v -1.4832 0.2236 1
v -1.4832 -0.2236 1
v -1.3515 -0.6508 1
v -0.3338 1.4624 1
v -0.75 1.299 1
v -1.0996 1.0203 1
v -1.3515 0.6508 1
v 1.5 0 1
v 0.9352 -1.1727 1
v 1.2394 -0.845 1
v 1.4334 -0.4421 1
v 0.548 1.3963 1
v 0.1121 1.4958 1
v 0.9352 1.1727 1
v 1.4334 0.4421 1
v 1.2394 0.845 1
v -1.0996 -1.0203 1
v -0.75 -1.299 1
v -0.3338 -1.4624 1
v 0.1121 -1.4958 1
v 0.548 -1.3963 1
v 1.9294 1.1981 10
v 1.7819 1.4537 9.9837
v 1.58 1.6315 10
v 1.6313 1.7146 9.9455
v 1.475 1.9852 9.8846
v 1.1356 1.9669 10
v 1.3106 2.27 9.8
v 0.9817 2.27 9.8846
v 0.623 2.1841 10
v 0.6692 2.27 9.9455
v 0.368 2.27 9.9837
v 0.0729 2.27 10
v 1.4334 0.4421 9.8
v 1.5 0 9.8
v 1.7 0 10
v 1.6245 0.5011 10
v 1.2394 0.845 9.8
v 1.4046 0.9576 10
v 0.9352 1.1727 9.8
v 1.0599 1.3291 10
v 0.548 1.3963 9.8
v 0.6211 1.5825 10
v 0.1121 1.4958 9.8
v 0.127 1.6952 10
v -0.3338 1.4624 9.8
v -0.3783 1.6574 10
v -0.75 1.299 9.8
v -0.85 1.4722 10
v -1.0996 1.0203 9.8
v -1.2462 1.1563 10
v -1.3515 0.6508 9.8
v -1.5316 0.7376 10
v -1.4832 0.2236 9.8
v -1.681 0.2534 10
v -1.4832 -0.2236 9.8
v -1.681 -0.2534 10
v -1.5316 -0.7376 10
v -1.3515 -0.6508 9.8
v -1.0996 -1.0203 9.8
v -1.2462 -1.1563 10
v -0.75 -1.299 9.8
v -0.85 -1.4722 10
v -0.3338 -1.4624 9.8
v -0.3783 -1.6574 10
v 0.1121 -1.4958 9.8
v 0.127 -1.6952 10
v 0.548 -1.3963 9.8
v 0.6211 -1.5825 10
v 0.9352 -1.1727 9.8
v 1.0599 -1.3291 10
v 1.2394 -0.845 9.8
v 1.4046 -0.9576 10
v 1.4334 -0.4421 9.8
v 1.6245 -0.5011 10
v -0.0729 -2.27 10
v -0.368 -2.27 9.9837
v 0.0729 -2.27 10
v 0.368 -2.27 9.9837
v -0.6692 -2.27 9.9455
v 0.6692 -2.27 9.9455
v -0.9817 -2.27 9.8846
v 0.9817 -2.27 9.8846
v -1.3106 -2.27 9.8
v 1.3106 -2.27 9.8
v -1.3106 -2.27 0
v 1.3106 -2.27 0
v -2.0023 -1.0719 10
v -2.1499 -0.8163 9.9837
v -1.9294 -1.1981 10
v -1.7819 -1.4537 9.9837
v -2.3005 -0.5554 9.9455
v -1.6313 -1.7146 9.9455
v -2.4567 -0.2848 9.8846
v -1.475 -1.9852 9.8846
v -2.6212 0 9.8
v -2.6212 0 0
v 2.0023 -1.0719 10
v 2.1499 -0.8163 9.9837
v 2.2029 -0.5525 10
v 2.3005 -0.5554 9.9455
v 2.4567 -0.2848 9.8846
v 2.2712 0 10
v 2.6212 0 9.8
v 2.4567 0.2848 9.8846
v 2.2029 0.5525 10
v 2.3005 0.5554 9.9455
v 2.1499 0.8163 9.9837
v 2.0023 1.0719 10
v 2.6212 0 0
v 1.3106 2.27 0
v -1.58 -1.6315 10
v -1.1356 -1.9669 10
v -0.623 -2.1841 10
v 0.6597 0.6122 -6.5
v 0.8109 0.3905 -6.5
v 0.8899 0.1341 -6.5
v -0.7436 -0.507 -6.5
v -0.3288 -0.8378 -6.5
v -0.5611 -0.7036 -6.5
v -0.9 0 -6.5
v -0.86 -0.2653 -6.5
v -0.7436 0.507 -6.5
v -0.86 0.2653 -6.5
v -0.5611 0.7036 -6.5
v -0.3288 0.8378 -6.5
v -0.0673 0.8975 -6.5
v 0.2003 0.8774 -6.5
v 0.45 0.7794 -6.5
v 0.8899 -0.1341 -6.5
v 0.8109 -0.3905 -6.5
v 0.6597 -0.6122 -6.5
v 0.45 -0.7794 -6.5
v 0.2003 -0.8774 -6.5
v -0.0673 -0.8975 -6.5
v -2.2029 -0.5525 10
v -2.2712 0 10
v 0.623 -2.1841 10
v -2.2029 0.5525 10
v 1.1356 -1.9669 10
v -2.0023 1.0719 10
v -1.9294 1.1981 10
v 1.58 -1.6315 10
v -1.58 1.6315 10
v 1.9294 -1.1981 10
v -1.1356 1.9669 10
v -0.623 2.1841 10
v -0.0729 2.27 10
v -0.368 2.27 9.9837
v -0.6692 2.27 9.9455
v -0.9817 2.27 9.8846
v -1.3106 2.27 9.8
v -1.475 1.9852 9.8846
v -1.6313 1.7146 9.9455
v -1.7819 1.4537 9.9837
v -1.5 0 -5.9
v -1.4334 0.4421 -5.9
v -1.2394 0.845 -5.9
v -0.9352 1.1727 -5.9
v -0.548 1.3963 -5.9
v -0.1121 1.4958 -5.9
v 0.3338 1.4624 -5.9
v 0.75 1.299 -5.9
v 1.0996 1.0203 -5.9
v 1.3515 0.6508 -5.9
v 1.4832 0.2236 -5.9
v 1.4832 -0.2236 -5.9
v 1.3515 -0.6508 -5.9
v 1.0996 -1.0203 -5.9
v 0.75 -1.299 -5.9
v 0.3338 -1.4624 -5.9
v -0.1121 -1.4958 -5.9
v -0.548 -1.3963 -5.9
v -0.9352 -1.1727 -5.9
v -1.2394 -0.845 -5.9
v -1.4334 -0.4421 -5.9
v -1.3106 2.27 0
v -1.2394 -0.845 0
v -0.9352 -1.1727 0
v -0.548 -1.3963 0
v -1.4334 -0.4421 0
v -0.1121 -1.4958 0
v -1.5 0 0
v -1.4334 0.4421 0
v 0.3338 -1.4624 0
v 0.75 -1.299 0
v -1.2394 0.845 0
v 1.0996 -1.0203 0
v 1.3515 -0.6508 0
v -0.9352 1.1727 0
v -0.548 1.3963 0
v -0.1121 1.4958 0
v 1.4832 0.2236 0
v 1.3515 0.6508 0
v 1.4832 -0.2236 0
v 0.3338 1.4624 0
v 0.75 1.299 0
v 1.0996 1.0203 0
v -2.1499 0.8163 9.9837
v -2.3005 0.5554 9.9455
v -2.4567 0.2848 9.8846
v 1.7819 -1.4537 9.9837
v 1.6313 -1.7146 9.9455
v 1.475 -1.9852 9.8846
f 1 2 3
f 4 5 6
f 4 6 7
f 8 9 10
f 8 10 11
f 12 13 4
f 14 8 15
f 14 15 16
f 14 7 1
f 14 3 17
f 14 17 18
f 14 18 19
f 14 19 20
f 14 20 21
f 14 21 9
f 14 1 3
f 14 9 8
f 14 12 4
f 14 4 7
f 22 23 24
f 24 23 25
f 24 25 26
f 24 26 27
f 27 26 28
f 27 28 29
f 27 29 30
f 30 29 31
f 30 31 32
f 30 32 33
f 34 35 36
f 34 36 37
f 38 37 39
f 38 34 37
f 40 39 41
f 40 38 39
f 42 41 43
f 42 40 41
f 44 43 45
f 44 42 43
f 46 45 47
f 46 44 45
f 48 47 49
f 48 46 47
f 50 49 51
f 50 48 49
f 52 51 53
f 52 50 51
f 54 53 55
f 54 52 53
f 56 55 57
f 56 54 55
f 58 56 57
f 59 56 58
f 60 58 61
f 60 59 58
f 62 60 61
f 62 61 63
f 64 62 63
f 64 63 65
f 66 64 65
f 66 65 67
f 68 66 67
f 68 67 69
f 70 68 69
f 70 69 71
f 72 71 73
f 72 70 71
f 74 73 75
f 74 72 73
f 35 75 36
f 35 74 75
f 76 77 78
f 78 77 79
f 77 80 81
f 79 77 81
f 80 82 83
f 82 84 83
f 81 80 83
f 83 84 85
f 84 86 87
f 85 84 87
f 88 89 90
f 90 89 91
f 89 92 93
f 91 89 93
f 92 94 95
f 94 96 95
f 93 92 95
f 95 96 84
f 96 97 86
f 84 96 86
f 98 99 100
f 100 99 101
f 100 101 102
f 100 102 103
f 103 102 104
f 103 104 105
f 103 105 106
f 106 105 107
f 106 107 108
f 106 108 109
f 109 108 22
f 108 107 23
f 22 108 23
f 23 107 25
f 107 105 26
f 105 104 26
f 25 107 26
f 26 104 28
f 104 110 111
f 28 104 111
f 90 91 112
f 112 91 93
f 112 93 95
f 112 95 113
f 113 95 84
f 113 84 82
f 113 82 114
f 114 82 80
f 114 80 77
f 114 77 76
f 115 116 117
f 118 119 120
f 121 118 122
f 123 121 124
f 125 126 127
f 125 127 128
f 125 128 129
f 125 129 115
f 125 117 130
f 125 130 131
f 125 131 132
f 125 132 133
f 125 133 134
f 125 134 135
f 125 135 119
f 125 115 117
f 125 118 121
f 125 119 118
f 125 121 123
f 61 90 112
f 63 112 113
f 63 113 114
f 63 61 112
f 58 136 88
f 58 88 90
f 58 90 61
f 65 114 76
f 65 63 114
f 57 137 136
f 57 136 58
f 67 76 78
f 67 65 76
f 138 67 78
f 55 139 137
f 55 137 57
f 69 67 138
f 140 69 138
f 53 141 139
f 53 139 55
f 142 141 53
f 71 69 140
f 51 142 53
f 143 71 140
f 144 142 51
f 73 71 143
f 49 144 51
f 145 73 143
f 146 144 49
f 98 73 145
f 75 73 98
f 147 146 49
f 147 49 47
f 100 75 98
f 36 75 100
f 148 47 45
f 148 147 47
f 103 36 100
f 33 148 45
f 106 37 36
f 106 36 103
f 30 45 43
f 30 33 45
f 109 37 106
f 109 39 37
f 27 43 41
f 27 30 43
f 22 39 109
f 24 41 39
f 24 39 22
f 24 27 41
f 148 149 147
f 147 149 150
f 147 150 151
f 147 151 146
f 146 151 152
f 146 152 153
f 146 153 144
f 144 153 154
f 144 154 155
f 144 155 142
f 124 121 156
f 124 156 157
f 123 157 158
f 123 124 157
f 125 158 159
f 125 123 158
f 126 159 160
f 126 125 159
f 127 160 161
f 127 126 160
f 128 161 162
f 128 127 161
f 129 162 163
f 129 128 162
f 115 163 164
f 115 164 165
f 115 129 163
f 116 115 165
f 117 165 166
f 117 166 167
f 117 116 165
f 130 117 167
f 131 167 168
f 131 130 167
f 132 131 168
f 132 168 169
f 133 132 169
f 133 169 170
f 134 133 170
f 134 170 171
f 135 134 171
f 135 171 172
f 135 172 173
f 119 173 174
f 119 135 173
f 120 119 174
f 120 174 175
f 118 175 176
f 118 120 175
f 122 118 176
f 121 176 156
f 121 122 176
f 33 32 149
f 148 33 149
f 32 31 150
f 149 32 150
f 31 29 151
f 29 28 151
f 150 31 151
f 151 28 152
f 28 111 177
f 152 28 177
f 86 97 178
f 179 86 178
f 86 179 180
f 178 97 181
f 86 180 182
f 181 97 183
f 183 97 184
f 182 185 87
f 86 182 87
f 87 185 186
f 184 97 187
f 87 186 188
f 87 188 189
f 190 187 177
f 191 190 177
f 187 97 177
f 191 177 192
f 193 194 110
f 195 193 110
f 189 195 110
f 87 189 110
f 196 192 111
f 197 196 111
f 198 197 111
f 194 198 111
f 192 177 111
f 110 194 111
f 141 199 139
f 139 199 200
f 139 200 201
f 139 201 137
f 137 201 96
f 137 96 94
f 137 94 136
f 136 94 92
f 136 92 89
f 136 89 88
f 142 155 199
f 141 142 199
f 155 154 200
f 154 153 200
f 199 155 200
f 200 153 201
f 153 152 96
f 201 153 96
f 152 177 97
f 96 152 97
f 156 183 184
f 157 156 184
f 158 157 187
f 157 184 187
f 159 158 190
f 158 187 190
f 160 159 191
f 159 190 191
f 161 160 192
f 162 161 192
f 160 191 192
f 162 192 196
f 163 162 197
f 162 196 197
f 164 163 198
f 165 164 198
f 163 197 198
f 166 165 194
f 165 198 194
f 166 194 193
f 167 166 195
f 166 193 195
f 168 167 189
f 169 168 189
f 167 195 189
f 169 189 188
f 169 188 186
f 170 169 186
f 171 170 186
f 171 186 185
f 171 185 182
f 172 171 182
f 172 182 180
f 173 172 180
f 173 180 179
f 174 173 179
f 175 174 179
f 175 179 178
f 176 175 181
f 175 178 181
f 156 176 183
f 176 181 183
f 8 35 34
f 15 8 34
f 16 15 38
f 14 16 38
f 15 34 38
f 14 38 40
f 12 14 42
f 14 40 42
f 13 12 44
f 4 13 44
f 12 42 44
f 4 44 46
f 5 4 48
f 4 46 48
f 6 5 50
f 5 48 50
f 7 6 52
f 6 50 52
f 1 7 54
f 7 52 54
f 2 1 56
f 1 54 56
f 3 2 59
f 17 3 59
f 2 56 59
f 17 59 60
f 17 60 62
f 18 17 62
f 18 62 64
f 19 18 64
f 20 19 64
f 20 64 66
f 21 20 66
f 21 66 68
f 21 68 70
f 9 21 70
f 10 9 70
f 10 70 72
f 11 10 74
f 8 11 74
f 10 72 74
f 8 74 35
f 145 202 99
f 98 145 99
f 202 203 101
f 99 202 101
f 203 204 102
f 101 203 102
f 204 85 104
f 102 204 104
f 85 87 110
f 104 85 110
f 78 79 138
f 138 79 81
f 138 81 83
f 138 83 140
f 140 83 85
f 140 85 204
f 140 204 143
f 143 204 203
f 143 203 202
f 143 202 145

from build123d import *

# Parameters (mm, degrees)
BOSS_EXTRUDE1_DEPTH     = 10
SKETCH2_R               = 1.5
CUT_EXTRUDE1_DEPTH      = 1
CUT_EXTRUDE1_DEPTH_BACK = 9
CHAMFER1_SIZE           = 0.2
SKETCH4_R               = 1.5
BOSS_EXTRUDE2_DEPTH     = 6.5
CHAMFER2_SIZE           = 0.6


with BuildPart() as part:
    # Sketch1 → Boss-Extrude1 (new body)
    with BuildSketch(Plane.XY):
        Polygon((2.621170222, 0), (1.310585111, 2.27), (-1.310585111, 2.27), (-2.621170222, 0), (-1.310585111, -2.27), (1.310585111, -2.27), align=None)
    extrude(amount=BOSS_EXTRUDE1_DEPTH)

    # Sketch2 → Cut-Extrude1 (cut, two sides)
    with BuildSketch(Plane.XY.offset(10)) as cut_extrude1_sk:
        Circle(SKETCH2_R)
    extrude(amount=CUT_EXTRUDE1_DEPTH, mode=Mode.SUBTRACT)
    extrude(cut_extrude1_sk.sketch, amount=-CUT_EXTRUDE1_DEPTH_BACK, mode=Mode.SUBTRACT)

    # Sketch3 → Cut-Revolve1 (revolve, cut)
    with BuildSketch(Plane(origin=(0, 0, 0), x_dir=(1, 0, 0), z_dir=(0, 1, 0))):
        Polygon((-2.621170222, -10), (-2.271170222, -10), (-2.621170222, -9.8), align=None)
    revolve(axis=Axis((0, 0, 1), (0, 0, 1)), mode=Mode.SUBTRACT)

    # Chamfer1
    chamfer1_edges = [part.edges().sort_by_distance(p)[0] for p in [
        (-1.5, 0, 10),
    ]]
    chamfer(chamfer1_edges, length=CHAMFER1_SIZE)

    # Sketch4 → Boss-Extrude2 (add)
    with BuildSketch(Plane(origin=(0, 0, 0), x_dir=(-1, 0, 0), z_dir=(0, 0, -1))):
        Circle(SKETCH4_R)
    extrude(amount=BOSS_EXTRUDE2_DEPTH)

    # Chamfer2
    chamfer2_edges = [part.edges().sort_by_distance(p)[0] for p in [
        (1.5, 0, -6.5),
    ]]
    chamfer(chamfer2_edges, length=CHAMFER2_SIZE)


solid = part.part
